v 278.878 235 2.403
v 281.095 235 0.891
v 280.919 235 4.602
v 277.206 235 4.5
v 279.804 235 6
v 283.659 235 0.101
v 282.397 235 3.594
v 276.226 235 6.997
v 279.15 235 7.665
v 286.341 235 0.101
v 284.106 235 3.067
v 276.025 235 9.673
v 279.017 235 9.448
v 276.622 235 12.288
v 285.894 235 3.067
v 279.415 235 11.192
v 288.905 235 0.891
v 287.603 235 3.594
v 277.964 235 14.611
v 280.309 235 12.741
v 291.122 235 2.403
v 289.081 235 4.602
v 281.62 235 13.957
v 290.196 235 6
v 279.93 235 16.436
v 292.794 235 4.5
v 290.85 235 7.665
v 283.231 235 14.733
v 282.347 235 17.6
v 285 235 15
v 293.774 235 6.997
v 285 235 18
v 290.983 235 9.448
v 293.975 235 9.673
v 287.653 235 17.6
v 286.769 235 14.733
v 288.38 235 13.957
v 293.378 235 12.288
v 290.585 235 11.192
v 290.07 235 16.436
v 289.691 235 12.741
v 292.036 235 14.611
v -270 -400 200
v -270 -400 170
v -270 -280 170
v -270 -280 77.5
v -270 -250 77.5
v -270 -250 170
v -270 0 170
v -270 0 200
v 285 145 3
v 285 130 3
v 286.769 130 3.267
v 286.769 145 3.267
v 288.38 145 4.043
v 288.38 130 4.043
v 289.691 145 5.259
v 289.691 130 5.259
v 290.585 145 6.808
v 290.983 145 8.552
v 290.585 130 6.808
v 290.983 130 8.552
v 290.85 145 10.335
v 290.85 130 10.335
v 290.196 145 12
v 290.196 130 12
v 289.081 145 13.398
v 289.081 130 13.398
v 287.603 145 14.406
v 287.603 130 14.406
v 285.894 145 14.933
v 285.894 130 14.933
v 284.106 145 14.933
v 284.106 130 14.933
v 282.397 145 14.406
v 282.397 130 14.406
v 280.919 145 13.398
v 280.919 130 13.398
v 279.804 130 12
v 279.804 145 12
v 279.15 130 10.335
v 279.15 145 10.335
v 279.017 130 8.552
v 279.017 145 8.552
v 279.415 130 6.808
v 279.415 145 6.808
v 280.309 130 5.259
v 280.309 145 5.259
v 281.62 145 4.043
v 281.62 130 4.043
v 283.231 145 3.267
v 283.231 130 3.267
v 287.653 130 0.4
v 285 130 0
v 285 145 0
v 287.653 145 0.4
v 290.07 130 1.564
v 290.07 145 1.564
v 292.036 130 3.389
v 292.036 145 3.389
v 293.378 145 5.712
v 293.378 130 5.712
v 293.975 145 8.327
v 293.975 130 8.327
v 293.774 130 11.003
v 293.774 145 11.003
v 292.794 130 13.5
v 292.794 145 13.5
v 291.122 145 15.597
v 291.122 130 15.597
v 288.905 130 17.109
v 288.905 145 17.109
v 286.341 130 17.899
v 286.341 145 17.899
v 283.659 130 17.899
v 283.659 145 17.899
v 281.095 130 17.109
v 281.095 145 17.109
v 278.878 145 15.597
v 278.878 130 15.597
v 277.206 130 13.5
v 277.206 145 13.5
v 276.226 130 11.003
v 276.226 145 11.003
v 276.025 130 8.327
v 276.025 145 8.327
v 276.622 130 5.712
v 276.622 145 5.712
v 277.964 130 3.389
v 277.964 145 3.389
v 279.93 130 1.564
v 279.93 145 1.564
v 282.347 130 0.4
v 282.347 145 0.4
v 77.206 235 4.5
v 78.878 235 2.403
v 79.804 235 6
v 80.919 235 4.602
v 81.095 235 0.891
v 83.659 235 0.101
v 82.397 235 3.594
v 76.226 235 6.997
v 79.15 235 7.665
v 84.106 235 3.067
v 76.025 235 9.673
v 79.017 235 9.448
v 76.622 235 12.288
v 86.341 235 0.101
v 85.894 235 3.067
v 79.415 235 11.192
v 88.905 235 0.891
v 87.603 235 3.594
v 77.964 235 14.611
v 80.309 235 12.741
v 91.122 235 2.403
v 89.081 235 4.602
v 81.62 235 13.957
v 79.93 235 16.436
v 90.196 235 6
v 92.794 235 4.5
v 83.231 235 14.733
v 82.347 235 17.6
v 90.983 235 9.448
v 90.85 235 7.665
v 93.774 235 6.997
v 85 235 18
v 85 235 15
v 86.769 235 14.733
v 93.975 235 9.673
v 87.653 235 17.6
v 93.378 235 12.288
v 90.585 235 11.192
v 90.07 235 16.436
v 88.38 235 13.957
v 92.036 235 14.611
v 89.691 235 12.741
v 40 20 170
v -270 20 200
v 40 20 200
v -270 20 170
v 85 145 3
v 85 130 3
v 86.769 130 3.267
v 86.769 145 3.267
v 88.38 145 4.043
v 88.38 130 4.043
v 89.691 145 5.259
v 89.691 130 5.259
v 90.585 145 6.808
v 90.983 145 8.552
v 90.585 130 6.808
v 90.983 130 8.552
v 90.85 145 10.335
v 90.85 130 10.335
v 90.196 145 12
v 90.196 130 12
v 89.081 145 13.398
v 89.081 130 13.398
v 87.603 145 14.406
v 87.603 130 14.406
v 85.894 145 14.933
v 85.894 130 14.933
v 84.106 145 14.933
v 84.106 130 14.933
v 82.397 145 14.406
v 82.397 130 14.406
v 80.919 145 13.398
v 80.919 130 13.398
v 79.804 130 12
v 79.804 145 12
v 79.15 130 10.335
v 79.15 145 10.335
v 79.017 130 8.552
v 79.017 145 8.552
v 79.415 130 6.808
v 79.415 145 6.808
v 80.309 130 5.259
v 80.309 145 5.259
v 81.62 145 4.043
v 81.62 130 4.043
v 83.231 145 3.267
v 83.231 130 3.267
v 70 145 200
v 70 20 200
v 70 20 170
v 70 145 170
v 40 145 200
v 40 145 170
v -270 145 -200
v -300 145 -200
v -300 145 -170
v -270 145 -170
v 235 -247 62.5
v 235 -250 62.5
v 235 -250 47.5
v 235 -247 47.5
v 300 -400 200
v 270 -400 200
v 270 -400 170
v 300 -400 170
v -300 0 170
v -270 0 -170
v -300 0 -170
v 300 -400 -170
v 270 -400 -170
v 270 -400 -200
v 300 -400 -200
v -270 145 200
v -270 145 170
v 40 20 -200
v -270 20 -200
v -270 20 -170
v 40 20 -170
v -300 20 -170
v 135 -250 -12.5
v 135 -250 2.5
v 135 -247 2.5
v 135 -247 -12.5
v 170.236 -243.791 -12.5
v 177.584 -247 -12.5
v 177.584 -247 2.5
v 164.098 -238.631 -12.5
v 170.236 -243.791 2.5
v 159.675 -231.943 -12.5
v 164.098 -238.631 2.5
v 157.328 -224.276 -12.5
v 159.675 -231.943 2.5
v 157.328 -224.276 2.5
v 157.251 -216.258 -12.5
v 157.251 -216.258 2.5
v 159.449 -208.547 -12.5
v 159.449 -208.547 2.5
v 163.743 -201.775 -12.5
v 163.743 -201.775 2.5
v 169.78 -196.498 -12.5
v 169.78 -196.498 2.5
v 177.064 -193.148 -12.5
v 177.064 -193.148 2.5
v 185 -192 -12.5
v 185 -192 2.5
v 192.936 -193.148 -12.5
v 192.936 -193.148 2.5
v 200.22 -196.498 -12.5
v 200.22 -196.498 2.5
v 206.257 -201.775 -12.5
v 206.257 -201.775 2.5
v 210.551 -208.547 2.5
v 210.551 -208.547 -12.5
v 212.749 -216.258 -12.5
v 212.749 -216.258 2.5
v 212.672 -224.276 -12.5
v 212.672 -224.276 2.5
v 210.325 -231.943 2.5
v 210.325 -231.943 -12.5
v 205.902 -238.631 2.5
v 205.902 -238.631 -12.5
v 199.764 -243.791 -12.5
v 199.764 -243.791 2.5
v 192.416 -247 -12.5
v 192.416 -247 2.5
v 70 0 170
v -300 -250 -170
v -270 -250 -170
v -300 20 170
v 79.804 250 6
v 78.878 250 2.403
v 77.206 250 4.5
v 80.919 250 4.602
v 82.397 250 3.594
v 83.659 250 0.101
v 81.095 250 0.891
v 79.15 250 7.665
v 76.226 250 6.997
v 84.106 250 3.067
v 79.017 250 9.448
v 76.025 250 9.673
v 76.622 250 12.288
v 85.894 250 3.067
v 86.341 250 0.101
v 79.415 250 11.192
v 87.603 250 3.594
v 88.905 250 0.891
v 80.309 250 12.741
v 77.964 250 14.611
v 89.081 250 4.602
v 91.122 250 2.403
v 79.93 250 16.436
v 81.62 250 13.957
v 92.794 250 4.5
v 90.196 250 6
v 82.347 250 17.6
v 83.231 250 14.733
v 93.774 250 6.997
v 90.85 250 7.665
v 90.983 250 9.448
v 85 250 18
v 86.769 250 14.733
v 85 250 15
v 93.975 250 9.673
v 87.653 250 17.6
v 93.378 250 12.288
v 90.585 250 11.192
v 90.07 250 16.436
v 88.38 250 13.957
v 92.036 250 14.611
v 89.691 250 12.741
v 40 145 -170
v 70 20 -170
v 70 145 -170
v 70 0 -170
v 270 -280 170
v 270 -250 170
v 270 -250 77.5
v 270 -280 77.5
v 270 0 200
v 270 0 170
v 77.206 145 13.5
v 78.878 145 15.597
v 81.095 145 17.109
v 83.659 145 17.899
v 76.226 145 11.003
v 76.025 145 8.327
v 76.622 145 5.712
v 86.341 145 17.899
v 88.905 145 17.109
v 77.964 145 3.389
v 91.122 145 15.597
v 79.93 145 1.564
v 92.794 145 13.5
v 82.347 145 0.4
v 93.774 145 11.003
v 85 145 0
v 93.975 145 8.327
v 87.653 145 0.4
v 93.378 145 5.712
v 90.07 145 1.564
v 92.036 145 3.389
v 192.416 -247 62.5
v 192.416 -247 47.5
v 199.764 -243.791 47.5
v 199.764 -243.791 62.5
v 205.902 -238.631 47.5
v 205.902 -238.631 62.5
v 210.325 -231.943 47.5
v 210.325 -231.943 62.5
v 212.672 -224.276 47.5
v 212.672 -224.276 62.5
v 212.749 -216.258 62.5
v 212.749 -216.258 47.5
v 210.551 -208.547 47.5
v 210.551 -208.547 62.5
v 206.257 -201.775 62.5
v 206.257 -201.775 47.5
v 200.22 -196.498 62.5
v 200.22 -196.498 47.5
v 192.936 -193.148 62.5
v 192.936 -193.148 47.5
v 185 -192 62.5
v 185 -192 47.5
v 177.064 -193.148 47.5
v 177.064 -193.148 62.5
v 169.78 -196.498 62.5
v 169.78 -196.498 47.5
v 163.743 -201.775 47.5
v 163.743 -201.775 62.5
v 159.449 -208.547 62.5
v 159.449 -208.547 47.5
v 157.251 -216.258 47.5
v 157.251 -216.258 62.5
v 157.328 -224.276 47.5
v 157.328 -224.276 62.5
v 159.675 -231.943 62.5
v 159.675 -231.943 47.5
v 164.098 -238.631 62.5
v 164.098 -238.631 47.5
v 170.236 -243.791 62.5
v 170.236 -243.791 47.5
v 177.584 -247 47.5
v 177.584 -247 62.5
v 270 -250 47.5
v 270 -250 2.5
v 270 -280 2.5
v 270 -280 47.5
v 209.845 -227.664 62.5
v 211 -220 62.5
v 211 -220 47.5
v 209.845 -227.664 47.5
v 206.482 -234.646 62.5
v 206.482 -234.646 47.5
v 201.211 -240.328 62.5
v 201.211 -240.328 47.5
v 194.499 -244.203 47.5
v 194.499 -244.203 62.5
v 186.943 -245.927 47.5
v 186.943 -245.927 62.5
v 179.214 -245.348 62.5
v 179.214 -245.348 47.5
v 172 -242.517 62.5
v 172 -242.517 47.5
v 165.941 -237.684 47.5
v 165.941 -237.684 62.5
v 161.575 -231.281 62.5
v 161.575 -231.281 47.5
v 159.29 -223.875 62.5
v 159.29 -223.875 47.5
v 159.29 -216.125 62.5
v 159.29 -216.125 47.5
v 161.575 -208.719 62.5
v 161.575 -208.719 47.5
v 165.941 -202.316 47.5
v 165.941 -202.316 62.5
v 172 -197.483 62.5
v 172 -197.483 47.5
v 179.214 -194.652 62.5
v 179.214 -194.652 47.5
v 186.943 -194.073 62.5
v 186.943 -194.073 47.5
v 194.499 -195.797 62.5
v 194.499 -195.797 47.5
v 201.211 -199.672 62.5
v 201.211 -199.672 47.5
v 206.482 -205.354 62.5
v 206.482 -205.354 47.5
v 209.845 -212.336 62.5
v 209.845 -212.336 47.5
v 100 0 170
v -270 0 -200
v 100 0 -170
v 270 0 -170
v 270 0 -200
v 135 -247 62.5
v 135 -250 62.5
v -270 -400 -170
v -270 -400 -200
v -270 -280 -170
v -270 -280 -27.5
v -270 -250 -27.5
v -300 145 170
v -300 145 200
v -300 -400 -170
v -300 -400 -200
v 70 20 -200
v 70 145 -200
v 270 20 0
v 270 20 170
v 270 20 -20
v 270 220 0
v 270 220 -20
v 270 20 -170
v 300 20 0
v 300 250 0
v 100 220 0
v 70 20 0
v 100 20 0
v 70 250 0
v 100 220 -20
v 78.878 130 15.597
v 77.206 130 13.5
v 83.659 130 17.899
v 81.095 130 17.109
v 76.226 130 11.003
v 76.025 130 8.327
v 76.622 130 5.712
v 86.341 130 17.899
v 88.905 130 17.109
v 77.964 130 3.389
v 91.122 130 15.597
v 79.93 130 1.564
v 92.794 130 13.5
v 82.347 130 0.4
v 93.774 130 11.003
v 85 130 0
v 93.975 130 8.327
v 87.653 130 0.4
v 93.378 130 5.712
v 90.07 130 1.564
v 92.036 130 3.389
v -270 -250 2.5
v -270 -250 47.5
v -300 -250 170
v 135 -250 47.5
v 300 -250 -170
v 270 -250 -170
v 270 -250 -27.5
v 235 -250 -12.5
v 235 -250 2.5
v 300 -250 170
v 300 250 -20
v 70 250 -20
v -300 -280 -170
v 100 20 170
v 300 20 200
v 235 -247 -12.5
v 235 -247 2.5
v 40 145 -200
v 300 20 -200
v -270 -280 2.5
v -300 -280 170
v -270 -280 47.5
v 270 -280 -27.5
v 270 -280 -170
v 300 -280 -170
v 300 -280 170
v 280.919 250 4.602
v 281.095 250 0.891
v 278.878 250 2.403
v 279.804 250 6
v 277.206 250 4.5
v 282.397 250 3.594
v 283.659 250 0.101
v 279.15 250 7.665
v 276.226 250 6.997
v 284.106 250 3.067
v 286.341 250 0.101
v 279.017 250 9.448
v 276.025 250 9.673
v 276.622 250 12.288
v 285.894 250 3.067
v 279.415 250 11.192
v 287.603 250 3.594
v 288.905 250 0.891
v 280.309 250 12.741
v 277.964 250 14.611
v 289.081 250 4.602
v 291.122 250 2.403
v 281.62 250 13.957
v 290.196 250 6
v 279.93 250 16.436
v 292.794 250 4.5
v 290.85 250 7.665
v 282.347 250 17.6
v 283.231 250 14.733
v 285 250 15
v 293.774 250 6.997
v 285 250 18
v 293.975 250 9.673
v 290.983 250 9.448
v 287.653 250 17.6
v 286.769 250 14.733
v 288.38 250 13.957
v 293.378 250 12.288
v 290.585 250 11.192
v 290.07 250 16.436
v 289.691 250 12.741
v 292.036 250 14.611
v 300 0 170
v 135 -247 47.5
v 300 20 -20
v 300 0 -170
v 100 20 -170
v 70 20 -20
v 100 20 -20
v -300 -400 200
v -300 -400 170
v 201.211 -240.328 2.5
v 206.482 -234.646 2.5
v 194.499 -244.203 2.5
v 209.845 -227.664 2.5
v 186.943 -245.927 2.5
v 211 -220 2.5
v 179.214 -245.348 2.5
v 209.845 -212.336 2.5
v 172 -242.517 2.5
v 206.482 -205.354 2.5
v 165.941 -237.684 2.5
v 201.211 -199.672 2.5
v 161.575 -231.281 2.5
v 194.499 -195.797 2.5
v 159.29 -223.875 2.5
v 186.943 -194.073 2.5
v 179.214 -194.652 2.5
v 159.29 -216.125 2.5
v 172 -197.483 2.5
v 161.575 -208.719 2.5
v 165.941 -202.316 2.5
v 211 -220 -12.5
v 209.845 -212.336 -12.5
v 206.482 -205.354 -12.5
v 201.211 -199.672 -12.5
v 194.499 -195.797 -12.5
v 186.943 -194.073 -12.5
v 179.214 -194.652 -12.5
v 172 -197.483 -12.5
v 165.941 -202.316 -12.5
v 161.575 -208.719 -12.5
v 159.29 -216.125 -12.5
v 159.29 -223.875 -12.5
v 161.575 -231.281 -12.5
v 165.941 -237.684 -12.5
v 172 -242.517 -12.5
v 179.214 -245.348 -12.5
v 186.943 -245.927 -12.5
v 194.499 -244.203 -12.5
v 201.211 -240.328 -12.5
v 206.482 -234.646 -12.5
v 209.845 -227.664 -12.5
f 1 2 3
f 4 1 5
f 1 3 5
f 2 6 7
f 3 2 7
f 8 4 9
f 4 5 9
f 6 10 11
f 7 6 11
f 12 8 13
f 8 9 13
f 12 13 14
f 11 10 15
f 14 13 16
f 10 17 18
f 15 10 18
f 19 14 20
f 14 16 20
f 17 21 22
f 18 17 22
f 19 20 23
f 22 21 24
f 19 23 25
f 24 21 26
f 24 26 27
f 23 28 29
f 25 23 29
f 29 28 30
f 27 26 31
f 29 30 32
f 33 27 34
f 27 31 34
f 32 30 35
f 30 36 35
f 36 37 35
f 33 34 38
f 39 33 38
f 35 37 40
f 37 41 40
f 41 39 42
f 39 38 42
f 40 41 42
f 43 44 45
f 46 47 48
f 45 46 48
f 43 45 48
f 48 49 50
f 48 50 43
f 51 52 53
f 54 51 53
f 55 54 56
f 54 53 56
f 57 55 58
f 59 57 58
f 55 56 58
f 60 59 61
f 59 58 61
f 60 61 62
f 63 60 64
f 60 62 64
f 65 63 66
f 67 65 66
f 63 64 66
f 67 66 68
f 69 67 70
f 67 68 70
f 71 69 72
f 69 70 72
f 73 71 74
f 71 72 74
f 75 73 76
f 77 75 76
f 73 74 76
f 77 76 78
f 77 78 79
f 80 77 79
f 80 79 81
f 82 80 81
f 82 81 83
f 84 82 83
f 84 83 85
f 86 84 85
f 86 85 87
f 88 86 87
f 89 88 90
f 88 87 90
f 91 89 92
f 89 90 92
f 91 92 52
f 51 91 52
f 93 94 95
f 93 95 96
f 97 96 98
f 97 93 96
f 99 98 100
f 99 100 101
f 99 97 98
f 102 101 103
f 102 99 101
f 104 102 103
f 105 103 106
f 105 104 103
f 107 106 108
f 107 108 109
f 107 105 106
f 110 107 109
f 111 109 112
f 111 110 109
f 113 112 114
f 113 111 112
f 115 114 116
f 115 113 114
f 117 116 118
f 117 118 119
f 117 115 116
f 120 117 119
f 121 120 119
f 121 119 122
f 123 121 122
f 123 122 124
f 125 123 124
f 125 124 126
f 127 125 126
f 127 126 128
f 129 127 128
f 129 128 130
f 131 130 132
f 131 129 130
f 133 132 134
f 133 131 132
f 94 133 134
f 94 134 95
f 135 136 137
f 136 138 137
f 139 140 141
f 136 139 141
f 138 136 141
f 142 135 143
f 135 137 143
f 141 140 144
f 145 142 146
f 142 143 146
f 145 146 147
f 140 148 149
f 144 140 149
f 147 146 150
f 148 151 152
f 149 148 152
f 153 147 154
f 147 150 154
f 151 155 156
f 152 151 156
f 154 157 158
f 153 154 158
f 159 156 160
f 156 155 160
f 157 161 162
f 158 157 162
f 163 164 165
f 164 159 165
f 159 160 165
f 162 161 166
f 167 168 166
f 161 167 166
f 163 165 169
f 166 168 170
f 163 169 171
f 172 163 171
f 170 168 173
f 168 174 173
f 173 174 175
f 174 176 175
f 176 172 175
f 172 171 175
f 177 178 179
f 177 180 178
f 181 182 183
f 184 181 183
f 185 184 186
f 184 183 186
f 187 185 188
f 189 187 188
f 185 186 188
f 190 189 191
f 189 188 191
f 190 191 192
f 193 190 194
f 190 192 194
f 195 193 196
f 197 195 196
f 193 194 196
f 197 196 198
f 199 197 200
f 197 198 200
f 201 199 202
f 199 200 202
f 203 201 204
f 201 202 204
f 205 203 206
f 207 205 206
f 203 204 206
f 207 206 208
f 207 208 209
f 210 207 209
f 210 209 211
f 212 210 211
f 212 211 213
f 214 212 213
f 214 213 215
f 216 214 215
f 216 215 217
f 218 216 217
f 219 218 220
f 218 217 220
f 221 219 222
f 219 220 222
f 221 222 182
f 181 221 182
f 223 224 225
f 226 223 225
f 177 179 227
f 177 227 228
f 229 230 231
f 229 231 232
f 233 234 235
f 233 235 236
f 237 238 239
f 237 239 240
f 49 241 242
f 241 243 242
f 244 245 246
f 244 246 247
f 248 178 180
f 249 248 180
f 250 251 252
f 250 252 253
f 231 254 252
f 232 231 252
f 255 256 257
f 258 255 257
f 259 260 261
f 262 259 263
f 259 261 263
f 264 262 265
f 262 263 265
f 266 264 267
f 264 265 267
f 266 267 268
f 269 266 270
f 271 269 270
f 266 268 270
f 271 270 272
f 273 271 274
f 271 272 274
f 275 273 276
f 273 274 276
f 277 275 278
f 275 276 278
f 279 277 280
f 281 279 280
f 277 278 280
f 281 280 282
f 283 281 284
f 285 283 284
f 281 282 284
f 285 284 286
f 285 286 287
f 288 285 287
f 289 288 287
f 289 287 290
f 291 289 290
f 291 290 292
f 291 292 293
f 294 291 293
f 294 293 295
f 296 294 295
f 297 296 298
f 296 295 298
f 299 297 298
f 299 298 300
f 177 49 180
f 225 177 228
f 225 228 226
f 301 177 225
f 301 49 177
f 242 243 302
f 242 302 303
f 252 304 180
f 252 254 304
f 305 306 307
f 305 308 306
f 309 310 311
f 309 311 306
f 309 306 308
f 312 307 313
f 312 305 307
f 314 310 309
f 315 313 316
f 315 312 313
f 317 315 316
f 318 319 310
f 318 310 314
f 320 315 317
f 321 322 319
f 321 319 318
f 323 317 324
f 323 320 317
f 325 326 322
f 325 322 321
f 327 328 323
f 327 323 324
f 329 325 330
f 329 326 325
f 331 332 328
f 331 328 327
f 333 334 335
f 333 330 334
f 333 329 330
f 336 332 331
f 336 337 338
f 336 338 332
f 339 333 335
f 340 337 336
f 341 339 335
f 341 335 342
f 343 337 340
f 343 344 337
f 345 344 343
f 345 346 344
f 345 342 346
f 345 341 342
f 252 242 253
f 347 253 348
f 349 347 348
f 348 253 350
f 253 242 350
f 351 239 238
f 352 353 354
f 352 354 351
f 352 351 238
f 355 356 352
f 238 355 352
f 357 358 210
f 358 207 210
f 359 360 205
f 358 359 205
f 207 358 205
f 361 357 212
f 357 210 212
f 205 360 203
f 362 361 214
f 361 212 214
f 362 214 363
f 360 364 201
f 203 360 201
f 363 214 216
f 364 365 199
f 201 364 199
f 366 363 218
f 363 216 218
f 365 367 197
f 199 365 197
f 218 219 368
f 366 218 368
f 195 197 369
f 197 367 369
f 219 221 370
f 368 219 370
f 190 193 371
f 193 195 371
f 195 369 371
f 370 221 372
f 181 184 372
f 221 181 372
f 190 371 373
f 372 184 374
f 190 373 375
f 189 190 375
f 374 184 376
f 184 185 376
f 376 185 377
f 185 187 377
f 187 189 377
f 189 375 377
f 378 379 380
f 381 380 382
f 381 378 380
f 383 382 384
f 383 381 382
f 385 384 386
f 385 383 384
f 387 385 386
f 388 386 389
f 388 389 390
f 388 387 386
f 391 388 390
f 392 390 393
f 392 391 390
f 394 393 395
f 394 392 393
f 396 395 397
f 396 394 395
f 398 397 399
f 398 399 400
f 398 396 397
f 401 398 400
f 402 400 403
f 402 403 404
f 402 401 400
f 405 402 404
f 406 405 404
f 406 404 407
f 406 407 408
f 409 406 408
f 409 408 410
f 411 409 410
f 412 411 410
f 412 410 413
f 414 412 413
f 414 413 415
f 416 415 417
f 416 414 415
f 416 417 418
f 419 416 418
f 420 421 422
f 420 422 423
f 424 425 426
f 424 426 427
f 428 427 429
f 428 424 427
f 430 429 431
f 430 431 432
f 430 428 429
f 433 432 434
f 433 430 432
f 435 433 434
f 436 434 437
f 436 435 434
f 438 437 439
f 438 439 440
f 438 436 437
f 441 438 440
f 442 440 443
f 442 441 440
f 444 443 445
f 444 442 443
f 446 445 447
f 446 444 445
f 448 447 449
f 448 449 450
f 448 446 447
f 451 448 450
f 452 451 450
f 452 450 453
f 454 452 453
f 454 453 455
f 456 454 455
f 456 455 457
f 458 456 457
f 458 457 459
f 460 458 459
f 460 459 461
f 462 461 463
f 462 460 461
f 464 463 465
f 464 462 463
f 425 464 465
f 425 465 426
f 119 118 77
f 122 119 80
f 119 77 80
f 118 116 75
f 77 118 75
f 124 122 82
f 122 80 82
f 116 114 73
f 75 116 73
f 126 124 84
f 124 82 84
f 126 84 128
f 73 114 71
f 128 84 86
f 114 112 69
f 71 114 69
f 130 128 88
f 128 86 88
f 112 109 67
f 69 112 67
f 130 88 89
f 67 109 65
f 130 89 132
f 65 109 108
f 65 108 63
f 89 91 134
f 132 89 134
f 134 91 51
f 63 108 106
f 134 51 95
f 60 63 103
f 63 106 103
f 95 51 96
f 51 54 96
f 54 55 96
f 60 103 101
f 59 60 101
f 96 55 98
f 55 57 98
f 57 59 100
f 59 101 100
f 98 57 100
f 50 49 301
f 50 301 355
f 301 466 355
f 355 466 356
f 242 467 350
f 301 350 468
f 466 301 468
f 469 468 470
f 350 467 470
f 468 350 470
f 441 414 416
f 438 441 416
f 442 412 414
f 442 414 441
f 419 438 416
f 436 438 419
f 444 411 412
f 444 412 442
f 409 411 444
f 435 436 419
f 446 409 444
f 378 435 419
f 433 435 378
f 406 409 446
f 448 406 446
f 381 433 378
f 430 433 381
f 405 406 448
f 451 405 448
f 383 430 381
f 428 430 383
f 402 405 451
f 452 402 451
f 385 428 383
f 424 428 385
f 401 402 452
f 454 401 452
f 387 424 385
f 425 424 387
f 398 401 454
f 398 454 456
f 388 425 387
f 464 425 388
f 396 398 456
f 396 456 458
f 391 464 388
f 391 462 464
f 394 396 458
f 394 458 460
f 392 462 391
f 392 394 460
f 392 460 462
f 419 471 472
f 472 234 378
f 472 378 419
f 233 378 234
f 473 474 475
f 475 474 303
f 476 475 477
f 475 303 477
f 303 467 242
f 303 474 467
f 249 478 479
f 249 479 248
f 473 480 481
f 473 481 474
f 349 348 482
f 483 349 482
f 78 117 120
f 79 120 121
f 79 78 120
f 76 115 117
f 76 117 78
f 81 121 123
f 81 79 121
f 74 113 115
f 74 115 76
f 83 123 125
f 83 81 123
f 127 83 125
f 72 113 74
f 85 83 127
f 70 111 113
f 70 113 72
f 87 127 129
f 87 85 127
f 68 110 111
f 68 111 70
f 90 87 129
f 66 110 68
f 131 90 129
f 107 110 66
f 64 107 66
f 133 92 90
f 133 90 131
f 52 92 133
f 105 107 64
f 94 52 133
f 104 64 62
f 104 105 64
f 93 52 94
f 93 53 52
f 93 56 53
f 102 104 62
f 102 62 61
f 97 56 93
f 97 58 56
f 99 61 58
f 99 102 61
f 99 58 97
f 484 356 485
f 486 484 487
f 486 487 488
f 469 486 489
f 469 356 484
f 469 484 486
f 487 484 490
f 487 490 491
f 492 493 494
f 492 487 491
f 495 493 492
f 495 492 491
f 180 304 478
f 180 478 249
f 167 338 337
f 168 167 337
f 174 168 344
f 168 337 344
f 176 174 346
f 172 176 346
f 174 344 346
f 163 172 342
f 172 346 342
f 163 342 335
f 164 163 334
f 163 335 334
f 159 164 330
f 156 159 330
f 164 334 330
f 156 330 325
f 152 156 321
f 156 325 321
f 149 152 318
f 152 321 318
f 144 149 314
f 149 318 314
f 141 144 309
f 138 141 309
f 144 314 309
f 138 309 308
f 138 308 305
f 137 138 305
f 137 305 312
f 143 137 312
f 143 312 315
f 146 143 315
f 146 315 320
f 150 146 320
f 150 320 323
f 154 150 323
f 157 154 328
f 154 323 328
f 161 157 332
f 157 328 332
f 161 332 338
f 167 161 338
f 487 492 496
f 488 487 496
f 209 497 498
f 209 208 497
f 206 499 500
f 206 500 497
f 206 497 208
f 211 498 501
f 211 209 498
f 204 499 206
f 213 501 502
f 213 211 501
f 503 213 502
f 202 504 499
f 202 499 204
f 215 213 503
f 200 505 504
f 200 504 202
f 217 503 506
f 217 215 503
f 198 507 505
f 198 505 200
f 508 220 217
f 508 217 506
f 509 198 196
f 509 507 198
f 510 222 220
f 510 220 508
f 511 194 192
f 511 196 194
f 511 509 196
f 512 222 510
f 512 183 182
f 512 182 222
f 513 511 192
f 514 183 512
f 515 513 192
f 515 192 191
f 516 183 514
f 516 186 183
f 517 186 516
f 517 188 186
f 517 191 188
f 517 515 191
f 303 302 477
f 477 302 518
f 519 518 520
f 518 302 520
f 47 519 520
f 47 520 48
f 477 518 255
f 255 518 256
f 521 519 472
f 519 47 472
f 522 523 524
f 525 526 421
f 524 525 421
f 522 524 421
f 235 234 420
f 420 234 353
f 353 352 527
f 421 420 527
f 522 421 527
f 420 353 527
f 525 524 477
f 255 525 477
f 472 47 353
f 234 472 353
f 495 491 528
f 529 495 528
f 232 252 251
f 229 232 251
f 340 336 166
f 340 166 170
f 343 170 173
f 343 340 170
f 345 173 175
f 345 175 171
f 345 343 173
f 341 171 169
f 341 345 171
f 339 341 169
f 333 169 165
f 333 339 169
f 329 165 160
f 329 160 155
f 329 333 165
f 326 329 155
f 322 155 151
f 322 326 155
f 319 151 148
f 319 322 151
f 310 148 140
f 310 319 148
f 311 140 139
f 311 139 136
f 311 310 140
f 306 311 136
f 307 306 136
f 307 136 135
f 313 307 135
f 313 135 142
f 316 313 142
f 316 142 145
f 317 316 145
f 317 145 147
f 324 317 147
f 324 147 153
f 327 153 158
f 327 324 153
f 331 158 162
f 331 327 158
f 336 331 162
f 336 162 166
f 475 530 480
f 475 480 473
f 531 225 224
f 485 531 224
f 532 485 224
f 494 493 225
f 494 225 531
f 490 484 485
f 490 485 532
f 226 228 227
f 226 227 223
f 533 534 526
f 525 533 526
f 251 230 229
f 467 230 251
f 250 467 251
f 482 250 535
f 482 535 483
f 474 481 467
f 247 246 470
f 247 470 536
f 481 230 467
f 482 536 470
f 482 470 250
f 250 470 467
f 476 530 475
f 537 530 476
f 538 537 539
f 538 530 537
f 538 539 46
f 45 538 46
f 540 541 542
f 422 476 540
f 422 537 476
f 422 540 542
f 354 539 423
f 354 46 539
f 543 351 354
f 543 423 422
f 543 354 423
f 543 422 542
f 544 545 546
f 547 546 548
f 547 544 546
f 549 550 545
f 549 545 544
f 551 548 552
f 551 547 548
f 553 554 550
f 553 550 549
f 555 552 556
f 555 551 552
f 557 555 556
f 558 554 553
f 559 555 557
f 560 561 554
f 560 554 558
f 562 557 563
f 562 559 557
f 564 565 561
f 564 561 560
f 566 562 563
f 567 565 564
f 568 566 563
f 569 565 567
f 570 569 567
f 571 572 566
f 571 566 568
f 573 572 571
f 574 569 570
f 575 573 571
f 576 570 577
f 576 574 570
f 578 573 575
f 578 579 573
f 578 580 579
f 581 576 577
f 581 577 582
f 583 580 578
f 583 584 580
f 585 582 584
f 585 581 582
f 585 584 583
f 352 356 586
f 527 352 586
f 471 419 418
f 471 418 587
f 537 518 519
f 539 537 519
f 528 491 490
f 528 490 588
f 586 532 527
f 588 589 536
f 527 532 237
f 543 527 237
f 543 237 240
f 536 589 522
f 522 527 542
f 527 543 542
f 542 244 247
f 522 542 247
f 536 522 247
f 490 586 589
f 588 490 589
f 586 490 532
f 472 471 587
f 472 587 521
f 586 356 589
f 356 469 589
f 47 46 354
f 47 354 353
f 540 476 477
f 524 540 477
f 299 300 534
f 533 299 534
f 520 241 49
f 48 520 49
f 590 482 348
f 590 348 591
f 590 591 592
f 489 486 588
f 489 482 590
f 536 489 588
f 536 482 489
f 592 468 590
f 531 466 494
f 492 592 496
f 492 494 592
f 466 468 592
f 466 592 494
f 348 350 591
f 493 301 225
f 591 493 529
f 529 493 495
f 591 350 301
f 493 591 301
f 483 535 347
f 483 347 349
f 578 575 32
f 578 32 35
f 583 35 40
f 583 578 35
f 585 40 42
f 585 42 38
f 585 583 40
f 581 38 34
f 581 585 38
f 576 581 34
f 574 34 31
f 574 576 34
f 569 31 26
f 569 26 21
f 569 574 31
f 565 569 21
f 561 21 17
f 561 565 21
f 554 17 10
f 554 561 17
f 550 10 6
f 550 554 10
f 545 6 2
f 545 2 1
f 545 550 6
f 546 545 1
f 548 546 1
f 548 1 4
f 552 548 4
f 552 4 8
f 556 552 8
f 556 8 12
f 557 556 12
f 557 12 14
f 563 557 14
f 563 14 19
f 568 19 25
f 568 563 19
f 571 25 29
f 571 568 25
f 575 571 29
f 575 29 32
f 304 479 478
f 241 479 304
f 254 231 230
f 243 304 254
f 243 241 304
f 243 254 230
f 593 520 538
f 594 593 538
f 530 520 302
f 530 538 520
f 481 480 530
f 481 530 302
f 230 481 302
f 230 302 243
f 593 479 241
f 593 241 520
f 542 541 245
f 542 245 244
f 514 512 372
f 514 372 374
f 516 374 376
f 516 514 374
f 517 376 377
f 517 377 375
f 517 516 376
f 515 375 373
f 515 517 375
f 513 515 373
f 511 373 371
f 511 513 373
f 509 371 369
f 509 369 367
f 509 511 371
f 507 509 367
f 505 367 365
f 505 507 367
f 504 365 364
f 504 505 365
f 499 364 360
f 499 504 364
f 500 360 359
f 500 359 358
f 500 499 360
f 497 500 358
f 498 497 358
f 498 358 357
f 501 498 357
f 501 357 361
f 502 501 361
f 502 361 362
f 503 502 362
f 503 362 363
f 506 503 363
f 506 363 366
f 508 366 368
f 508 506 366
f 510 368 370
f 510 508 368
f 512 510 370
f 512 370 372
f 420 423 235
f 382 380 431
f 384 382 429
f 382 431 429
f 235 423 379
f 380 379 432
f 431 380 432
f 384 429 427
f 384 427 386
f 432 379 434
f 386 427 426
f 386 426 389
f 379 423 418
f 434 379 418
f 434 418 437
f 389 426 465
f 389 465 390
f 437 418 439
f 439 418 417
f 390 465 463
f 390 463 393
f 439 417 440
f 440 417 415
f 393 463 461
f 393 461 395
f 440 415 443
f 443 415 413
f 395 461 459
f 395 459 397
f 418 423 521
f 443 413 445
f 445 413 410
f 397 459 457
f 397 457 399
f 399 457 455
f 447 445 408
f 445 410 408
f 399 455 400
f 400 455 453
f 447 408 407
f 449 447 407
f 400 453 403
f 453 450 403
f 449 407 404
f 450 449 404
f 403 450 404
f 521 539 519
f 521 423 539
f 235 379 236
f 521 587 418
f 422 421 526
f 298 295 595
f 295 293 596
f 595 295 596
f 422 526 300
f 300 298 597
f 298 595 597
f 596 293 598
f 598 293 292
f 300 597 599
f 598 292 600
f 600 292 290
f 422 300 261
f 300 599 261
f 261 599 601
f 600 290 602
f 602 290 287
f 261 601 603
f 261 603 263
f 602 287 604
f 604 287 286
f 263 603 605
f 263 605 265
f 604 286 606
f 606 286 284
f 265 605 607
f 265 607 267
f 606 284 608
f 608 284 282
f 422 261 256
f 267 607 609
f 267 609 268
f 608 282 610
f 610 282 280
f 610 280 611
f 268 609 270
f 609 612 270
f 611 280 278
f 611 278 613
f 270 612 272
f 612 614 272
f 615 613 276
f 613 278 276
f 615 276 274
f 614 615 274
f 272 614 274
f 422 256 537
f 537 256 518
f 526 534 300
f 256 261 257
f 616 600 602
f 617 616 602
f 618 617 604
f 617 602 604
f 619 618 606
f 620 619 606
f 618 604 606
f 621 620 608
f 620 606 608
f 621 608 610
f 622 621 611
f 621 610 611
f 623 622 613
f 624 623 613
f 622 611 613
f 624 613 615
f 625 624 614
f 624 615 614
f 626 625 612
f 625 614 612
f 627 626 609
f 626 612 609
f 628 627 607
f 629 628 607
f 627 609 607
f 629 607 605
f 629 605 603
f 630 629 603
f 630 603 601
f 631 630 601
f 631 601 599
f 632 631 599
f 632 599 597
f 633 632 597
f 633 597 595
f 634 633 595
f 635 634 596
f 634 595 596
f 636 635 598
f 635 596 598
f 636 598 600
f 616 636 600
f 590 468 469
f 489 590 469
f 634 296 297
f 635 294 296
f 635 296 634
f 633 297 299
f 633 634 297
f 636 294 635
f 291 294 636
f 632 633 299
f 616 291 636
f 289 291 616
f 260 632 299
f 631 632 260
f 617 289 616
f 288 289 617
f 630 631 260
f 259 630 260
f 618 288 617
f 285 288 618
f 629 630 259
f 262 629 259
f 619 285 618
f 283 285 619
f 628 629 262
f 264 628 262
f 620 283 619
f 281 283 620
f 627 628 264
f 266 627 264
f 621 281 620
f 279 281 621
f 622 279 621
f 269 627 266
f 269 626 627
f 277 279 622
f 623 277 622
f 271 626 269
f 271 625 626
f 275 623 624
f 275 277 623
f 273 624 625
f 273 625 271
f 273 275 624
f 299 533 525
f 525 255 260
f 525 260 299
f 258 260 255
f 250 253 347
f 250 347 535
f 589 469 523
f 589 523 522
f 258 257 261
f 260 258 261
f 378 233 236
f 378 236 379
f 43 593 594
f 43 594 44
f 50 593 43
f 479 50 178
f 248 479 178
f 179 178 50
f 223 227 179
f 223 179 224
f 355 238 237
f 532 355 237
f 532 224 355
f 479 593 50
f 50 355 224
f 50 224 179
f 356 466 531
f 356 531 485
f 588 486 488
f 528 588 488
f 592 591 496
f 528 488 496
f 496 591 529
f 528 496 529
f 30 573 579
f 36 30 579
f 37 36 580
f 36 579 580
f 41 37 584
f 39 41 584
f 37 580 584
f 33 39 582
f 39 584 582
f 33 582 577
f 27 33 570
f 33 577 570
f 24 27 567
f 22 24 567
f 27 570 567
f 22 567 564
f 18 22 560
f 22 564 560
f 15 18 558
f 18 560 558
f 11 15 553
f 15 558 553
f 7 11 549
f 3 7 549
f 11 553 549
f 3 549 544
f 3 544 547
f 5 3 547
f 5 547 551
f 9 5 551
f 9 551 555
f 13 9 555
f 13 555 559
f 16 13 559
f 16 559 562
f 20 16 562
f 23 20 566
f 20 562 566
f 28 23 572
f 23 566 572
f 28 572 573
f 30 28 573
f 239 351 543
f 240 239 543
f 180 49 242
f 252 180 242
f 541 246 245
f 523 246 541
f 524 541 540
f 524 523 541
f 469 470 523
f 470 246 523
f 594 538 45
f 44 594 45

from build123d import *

# Parameters (mm, degrees)
SKETCH4_W              = 600
SKETCH4_H              = 400
SKETCH4_W_2            = 540
SKETCH4_H_2            = 340
BOSS_EXTRUDE2_DEPTH    = 20
SKETCH10_W             = 30
SKETCH10_H             = 20
BOSS_EXTRUDE7_DEPTH    = 370
SKETCH11_W             = 30
SKETCH11_H             = 20
BOSS_EXTRUDE8_DEPTH    = 230
SKETCH12_W             = 20
SKETCH12_H             = 30
BOSS_EXTRUDE9_DEPTH    = 170
SKETCH13_R             = 9
SKETCH13_R_2           = 6
BOSS_EXTRUDE10_DEPTH   = 15
BOSS_EXTRUDE10_2_DEPTH = 15
SKETCH14_W             = 20
SKETCH14_H             = 30
BOSS_EXTRUDE11_DEPTH   = 170
SKETCH15_R             = 9
SKETCH15_R_2           = 6
BOSS_EXTRUDE12_DEPTH   = 15
BOSS_EXTRUDE12_2_DEPTH = 15
SKETCH16_W             = 170
SKETCH16_H             = 30
CUT_EXTRUDE1_DEPTH     = 20
SKETCH17_W             = 30
SKETCH17_H             = 30
BOSS_EXTRUDE13_DEPTH   = 500
SKETCH18_W             = 30
SKETCH18_H             = 30
BOSS_EXTRUDE14_DEPTH   = 370
SKETCH19_W             = 30
SKETCH19_H             = 30
BOSS_EXTRUDE15_DEPTH   = 570
SKETCH21_R             = 26
BOSS_EXTRUDE17_DEPTH   = 15
BOSS_EXTRUDE18_START   = -15
SKETCH22_R             = 26
BOSS_EXTRUDE18_DEPTH   = 15
SKETCH23_W             = 30
SKETCH23_H             = 30
CUT_EXTRUDE2_DEPTH     = 100
SKETCH24_W             = 30
SKETCH24_H             = 30
BOSS_EXTRUDE19_DEPTH   = 125


with BuildPart() as part:
    # Sketch4 → Boss-Extrude2 (new body)
    with BuildSketch(Plane(origin=(0, 0, 0), x_dir=(1, 0, 0), z_dir=(0, 1, 0))):
        Rectangle(SKETCH4_W, SKETCH4_H)
        Rectangle(SKETCH4_W_2, SKETCH4_H_2, mode=Mode.SUBTRACT)
    extrude(amount=BOSS_EXTRUDE2_DEPTH)

    # Sketch10 → Boss-Extrude7 (add)
    with BuildSketch(Plane.XY.offset(200)):
        with Locations((85, 10)):
            Rectangle(SKETCH10_W, SKETCH10_H)
    extrude(amount=-BOSS_EXTRUDE7_DEPTH)

    # Sketch11 → Boss-Extrude8 (add)
    with BuildSketch(Plane(origin=(0, 20, 0), x_dir=(1, 0, 0), z_dir=(0, 1, 0))):
        with Locations((85, 10)):
            Rectangle(SKETCH11_W, SKETCH11_H)
        with Locations((285, 10)):
            Rectangle(SKETCH11_W, SKETCH11_H)
    extrude(amount=BOSS_EXTRUDE8_DEPTH)

    # Sketch12 → Boss-Extrude9 (add)
    with BuildSketch(Plane(origin=(100, 0, 0), x_dir=(0, 0, -1), z_dir=(1, 0, 0))):
        with Locations((10, 235)):
            Rectangle(SKETCH12_W, SKETCH12_H)
    extrude(amount=BOSS_EXTRUDE9_DEPTH)

    # Sketch14 → Boss-Extrude11 (add)
    with BuildSketch(Plane(origin=(100, 0, 0), x_dir=(0, 0, -1), z_dir=(1, 0, 0))):
        with Locations((10, 145)):
            Rectangle(SKETCH14_W, SKETCH14_H)
    extrude(amount=BOSS_EXTRUDE11_DEPTH)

    # Sketch16 → Cut-Extrude1 (cut)
    with BuildSketch(Plane(origin=(0, 0, -20), x_dir=(-1, 0, 0), z_dir=(0, 0, -1))):
        with Locations((-185, 145)):
            Rectangle(SKETCH16_W, SKETCH16_H)
    extrude(amount=-CUT_EXTRUDE1_DEPTH, mode=Mode.SUBTRACT)

    # Sketch17 → Boss-Extrude13 (add)
    with BuildSketch(Plane.XZ):
        with Locations((-285, 185)):
            Rectangle(SKETCH17_W, SKETCH17_H)
        with Locations((285, 185)):
            Rectangle(SKETCH17_W, SKETCH17_H)
        with Locations((285, -185)):
            Rectangle(SKETCH17_W, SKETCH17_H)
        with Locations((-285, -185)):
            Rectangle(SKETCH17_W, SKETCH17_H)
    extrude(amount=BOSS_EXTRUDE13_DEPTH)

    # Sketch18 → Boss-Extrude14 (add)
    with BuildSketch(Plane.XY.offset(200)):
        with Locations((285, -265)):
            Rectangle(SKETCH18_W, SKETCH18_H)
        with Locations((-285, -265)):
            Rectangle(SKETCH18_W, SKETCH18_H)
    extrude(amount=-BOSS_EXTRUDE14_DEPTH)

    # Sketch19 → Boss-Extrude15 (add)
    with BuildSketch(Plane.ZY.offset(300)):
        with Locations((-12.5, -265)):
            Rectangle(SKETCH19_W, SKETCH19_H)
        with Locations((62.5, -265)):
            Rectangle(SKETCH19_W, SKETCH19_H)
    extrude(amount=-BOSS_EXTRUDE15_DEPTH)

    # Sketch21 → Boss-Extrude17 (add)
    with BuildSketch(Plane.XY.offset(2.5)):
        with BuildLine():
            Line((192.416198487, -247), (235, -247))
            Line((235, -247), (235, -253))
            Line((235, -253), (135, -253))
            Line((135, -253), (135, -247))
            Line((135, -247), (177.583801513, -247))
            ThreePointArc((177.583801513, -247), (185, -192), (192.416198487, -247))
        make_face()
        with Locations((185, -220)):
            Circle(SKETCH21_R, mode=Mode.SUBTRACT)
    extrude(amount=-BOSS_EXTRUDE17_DEPTH)

    # Sketch22 → Boss-Extrude18 (add)
    with BuildSketch(Plane(origin=(0, 0, 47.5), x_dir=(-1, 0, 0), z_dir=(0, 0, -1)).offset(BOSS_EXTRUDE18_START)):
        with BuildLine():
            Line((-177.583801513, -247), (-135, -247))
            Line((-135, -247), (-135, -250))
            Line((-135, -250), (-235, -250))
            Line((-235, -250), (-235, -247))
            Line((-235, -247), (-192.416198487, -247))
            ThreePointArc((-192.416198487, -247), (-185, -192), (-177.583801513, -247))
        make_face()
        with Locations(Location((-185, -220, 0), (0, 0, 180))):
            Circle(SKETCH22_R, mode=Mode.SUBTRACT)
    extrude(amount=BOSS_EXTRUDE18_DEPTH)

    # Sketch23 → Cut-Extrude2 (cut)
    with BuildSketch(Plane.XZ.offset(500)):
        with Locations((-285, 185)):
            Rectangle(SKETCH23_W, SKETCH23_H)
        with Locations((285, 185)):
            Rectangle(SKETCH23_W, SKETCH23_H)
        with Locations((285, -185)):
            Rectangle(SKETCH23_W, SKETCH23_H)
        with Locations((-285, -185)):
            Rectangle(SKETCH23_W, SKETCH23_H)
    extrude(amount=-CUT_EXTRUDE2_DEPTH, mode=Mode.SUBTRACT)

    # Sketch24 → Boss-Extrude19 (add)
    with BuildSketch(Plane(origin=(0, 20, 0), x_dir=(1, 0, 0), z_dir=(0, 1, 0))):
        with Locations((-285, 185)):
            Rectangle(SKETCH24_W, SKETCH24_H)
        with Locations((55, 185)):
            Rectangle(SKETCH24_W, SKETCH24_H)
        with Locations((55, -185)):
            Rectangle(SKETCH24_W, SKETCH24_H)
        with Locations((-285, -185)):
            Rectangle(SKETCH24_W, SKETCH24_H)
    extrude(amount=BOSS_EXTRUDE19_DEPTH)


with BuildPart() as body_2:
    # Sketch13 → Boss-Extrude10 (new body)
    with BuildSketch(Plane(origin=(0, 250, 0), x_dir=(1, 0, 0), z_dir=(0, 1, 0))):
        with Locations(Location((85, -9, 0), (0, 0, 270))):
            Circle(SKETCH13_R)
        with Locations(Location((85, -9, 0), (0, 0, 270))):
            Circle(SKETCH13_R_2, mode=Mode.SUBTRACT)
    extrude(amount=-BOSS_EXTRUDE10_DEPTH)


with BuildPart() as body_3:
    # Sketch13 → Boss-Extrude10 2 (new body)
    with BuildSketch(Plane(origin=(0, 250, 0), x_dir=(1, 0, 0), z_dir=(0, 1, 0))):
        with Locations(Location((285, -9, 0), (0, 0, 270))):
            Circle(SKETCH13_R)
        with Locations(Location((285, -9, 0), (0, 0, 270))):
            Circle(SKETCH13_R_2, mode=Mode.SUBTRACT)
    extrude(amount=-BOSS_EXTRUDE10_2_DEPTH)


with BuildPart() as body_4:
    # Sketch15 → Boss-Extrude12 (new body)
    with BuildSketch(Plane.XZ.offset(-130)):
        with Locations(Location((85, 9, 0), (0, 0, 270))):
            Circle(SKETCH15_R)
        with Locations(Location((85, 9, 0), (0, 0, 270))):
            Circle(SKETCH15_R_2, mode=Mode.SUBTRACT)
    extrude(amount=-BOSS_EXTRUDE12_DEPTH)


with BuildPart() as body_5:
    # Sketch15 → Boss-Extrude12 2 (new body)
    with BuildSketch(Plane.XZ.offset(-130)):
        with Locations(Location((285, 9, 0), (0, 0, 270))):
            Circle(SKETCH15_R)
        with Locations(Location((285, 9, 0), (0, 0, 270))):
            Circle(SKETCH15_R_2, mode=Mode.SUBTRACT)
    extrude(amount=-BOSS_EXTRUDE12_2_DEPTH)


solid = Compound([part.part, body_2.part, body_3.part, body_4.part, body_5.part])
